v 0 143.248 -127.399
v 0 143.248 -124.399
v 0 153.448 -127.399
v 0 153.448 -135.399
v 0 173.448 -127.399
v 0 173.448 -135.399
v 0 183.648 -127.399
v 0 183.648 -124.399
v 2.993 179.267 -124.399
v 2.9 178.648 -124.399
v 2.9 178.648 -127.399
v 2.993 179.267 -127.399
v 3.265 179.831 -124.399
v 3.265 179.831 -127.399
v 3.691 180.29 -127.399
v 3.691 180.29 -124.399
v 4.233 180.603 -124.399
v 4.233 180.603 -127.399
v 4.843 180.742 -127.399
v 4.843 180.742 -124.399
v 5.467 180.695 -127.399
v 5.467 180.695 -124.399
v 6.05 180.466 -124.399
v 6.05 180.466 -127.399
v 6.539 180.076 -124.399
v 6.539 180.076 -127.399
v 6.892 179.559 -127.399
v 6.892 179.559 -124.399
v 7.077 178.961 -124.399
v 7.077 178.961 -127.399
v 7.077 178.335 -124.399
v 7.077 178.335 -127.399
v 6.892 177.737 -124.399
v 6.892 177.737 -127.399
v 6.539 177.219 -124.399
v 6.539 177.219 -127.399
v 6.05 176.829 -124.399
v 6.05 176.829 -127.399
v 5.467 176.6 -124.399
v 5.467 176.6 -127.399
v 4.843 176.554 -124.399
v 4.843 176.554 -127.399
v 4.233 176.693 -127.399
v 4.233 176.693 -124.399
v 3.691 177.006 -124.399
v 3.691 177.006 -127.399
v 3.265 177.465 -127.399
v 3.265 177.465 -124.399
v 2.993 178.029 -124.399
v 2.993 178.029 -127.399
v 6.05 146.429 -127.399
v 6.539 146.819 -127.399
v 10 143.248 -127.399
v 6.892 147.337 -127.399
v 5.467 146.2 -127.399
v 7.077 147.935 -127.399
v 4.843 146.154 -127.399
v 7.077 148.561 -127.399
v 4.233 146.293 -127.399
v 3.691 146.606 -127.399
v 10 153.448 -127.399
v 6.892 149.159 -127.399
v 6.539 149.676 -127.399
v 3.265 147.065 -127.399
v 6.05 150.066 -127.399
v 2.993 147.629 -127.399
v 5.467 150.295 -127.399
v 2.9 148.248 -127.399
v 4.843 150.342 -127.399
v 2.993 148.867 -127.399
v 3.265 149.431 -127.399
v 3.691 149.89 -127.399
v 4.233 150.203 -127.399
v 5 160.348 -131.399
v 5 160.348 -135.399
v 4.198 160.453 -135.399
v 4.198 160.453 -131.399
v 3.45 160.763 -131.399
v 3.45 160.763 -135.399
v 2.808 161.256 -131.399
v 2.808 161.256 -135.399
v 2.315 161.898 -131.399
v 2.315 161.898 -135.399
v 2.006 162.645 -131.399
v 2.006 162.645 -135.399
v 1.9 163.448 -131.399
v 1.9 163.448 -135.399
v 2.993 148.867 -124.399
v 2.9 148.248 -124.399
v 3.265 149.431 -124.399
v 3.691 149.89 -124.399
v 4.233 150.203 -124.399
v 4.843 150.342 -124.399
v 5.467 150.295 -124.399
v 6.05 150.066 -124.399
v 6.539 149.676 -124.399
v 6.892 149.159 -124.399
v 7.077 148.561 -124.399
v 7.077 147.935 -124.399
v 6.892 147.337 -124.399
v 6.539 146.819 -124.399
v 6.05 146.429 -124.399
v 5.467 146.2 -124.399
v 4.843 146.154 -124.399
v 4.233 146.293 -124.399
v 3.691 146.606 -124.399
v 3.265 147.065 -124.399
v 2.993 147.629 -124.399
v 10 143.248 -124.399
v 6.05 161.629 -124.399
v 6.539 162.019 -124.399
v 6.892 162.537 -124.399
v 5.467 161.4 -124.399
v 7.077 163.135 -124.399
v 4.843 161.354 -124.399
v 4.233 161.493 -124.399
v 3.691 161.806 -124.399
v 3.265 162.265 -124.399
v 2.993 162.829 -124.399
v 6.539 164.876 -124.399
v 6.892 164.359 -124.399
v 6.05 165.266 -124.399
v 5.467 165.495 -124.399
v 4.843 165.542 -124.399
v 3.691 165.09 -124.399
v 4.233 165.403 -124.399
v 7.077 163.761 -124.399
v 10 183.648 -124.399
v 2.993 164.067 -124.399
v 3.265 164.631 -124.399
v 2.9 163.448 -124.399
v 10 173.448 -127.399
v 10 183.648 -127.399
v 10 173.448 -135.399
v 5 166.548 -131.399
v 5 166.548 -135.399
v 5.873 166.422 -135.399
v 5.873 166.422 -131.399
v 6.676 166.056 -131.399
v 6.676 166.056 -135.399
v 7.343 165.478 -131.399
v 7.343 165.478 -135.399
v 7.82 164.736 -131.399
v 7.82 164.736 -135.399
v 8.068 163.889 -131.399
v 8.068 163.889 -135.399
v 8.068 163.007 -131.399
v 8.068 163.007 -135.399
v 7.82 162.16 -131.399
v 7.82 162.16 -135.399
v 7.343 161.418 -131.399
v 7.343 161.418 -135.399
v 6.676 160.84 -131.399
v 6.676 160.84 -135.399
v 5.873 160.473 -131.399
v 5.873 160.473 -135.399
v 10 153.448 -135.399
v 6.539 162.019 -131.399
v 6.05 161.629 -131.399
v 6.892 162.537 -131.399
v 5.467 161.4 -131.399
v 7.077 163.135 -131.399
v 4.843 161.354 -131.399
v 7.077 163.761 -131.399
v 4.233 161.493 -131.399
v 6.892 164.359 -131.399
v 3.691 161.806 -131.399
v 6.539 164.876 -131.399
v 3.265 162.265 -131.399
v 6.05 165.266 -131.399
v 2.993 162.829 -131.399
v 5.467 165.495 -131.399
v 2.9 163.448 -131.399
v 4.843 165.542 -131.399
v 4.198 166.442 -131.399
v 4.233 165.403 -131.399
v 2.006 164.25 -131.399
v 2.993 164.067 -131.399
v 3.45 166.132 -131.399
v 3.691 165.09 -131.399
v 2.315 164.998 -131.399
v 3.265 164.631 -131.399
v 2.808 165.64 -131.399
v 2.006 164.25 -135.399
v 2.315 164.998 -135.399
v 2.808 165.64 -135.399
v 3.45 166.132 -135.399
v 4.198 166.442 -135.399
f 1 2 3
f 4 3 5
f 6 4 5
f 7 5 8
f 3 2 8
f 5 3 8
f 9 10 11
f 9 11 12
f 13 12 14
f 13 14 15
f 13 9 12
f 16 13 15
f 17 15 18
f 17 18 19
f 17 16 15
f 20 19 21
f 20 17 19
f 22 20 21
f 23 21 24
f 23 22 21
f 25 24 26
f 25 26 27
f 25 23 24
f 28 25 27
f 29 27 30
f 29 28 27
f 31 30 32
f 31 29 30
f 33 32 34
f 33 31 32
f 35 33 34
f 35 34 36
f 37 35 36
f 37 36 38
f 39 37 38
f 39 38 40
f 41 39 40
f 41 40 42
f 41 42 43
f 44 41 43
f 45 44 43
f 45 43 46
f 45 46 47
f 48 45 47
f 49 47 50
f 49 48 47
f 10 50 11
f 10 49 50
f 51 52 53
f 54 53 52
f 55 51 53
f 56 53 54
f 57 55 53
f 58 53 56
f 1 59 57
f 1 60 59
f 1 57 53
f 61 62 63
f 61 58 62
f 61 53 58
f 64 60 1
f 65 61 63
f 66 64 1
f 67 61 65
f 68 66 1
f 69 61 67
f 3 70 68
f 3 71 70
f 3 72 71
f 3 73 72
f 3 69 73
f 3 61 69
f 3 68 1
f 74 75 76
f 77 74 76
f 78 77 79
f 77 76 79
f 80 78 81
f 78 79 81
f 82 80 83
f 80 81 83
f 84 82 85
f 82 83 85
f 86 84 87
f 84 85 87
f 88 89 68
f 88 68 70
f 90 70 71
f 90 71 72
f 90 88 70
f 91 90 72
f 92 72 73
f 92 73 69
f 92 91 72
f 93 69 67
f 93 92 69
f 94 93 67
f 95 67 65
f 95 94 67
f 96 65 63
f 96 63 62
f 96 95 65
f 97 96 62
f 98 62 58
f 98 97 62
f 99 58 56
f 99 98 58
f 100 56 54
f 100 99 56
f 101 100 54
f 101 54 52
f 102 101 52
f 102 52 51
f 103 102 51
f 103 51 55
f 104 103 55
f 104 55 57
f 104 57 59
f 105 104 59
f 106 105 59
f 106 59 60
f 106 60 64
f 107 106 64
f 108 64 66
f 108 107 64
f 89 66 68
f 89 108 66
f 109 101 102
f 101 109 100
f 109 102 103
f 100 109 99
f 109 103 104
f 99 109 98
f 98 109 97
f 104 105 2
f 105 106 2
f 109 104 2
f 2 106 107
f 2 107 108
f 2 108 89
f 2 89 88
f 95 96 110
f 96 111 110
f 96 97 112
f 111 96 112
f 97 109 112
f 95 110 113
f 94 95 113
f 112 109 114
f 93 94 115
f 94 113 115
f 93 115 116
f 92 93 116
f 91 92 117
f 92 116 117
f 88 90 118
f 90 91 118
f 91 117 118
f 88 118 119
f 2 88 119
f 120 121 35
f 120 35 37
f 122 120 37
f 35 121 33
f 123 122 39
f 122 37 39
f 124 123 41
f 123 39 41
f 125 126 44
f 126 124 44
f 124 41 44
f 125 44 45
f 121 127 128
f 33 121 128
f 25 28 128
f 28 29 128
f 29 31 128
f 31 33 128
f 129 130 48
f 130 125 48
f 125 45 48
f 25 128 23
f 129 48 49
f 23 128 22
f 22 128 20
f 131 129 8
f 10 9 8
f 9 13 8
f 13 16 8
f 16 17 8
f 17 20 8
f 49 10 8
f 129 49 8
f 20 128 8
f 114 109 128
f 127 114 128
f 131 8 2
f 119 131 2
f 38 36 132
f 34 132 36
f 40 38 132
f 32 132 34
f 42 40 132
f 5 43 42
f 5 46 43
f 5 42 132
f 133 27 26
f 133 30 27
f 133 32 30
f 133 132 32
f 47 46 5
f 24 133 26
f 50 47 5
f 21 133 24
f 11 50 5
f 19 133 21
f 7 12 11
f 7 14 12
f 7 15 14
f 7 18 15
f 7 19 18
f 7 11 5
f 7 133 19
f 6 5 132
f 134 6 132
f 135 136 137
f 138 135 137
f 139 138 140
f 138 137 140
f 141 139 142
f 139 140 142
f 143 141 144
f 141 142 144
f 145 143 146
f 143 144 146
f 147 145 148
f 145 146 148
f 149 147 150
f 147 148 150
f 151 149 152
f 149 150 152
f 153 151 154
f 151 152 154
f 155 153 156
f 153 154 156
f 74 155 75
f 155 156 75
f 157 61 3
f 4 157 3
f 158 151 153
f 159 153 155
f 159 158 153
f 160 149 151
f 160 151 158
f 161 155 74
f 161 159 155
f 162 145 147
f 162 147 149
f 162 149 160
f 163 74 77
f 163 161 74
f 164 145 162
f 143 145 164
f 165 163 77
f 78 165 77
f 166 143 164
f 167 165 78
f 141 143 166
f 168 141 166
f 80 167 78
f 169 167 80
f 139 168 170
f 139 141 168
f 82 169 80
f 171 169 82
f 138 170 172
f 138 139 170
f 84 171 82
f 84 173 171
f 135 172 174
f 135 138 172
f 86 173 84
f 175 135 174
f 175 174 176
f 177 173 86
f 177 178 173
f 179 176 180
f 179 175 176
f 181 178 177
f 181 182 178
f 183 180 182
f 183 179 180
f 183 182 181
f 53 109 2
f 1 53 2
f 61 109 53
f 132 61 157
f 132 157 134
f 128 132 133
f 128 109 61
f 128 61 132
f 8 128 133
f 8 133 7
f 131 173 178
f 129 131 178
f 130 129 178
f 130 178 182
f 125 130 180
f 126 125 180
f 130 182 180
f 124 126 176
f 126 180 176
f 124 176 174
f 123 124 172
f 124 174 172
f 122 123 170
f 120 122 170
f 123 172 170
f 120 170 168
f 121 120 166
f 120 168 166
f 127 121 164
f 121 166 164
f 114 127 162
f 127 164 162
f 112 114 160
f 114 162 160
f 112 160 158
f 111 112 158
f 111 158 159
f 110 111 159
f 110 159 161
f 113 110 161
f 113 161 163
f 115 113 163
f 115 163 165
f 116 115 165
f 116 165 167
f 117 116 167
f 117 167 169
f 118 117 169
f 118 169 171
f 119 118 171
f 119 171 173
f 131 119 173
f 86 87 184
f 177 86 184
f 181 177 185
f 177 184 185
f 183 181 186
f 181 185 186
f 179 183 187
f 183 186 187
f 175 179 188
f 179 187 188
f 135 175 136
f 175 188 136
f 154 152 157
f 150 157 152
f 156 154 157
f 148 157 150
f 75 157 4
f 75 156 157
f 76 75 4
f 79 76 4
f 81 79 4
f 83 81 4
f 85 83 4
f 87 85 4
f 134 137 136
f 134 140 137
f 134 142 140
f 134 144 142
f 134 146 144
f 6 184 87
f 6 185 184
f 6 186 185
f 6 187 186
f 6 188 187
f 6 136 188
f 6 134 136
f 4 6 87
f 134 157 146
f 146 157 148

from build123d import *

# Parameters (mm, degrees)
CROQUIS1_W              = 10
CROQUIS1_H              = 10
CROQUIS1_H_2            = 20.4
CROQUIS1_R              = 2.1
SALIENTE_EXTRUIR1_DEPTH = 3
CROQUIS2_W              = 5
CROQUIS2_H              = 20
SALIENTE_EXTRUIR2_DEPTH = 8
CORTAR_EXTRUIR1_DEPTH   = 4
CROQUIS4_R              = 2.1
CORTAR_EXTRUIR2_DEPTH   = 185.05302625


with BuildPart() as part:
    # Croquis1 → Saliente-Extruir1 (new body)
    # profile 1 of 6: a face of its own
    with BuildSketch(Plane(origin=(0, 0, -124.398862982), x_dir=(-1, 0, 0), z_dir=(0, 0, -1))):
        with Locations((-5, 178.647805519)):
            Rectangle(CROQUIS1_W, CROQUIS1_H)
        with BuildLine():
            ThreePointArc((-7.522554348, 176.84593994), (-7.904499228, 177.217722585), (-8.39233871, 177.432470964))
            ThreePointArc((-8.39233871, 177.432470964), (-9.35, 178.647805519), (-8.39233871, 179.863140073))
            ThreePointArc((-8.39233871, 179.863140073), (-7.904499228, 180.077888452), (-7.522554348, 180.449671097))
            ThreePointArc((-7.522554348, 180.449671097), (-1.9, 178.647805519), (-7.522554348, 176.84593994))
        make_face(mode=Mode.SUBTRACT)
    # profile 2 of 6: a face of its own
    with BuildSketch(Plane(origin=(0, 0, -124.398862982), x_dir=(-1, 0, 0), z_dir=(0, 0, -1))):
        with Locations((-5, 163.447805519)):
            Rectangle(CROQUIS1_W, CROQUIS1_H_2)
    # profile 3 of 6: a face of its own
    with BuildSketch(Plane(origin=(0, 0, -124.398862982), x_dir=(-1, 0, 0), z_dir=(0, 0, -1))):
        with Locations((-5, 148.247805519)):
            Rectangle(CROQUIS1_W, CROQUIS1_H)
        with BuildLine():
            ThreePointArc((-1.9, 148.247805519), (-4.053934061, 145.295694538), (-7.522554348, 146.44593994))
            ThreePointArc((-7.522554348, 146.44593994), (-8.1, 148.247805519), (-7.522554348, 150.049671097))
            ThreePointArc((-7.522554348, 150.049671097), (-4.053934061, 151.199916499), (-1.9, 148.247805519))
        make_face(mode=Mode.SUBTRACT)
    # profile 4 of 6: a face of its own
    with BuildSketch(Plane(origin=(0, 0, -124.398862982), x_dir=(-1, 0, 0), z_dir=(0, 0, -1))):
        with BuildLine():
            ThreePointArc((-7.522554348, 150.049671097), (-8.1, 148.247805519), (-7.522554348, 146.44593994))
            ThreePointArc((-7.522554348, 146.44593994), (-4.053934061, 145.295694538), (-1.9, 148.247805519))
            ThreePointArc((-1.9, 148.247805519), (-4.053934061, 151.199916499), (-7.522554348, 150.049671097))
        make_face()
        with Locations((-5, 148.247805519)):
            Circle(CROQUIS1_R, mode=Mode.SUBTRACT)
    # profile 5 of 6: a face of its own
    with BuildSketch(Plane(origin=(0, 0, -124.398862982), x_dir=(-1, 0, 0), z_dir=(0, 0, -1))):
        with BuildLine():
            ThreePointArc((-7.522554348, 180.449671097), (-8.1, 178.647805519), (-7.522554348, 176.84593994))
            ThreePointArc((-7.522554348, 176.84593994), (-4.053934061, 175.695694538), (-1.9, 178.647805519))
            ThreePointArc((-1.9, 178.647805519), (-4.053934061, 181.599916499), (-7.522554348, 180.449671097))
        make_face()
        with Locations((-5, 178.647805519)):
            Circle(CROQUIS1_R, mode=Mode.SUBTRACT)
    # profile 6 of 6: a face of its own
    with BuildSketch(Plane(origin=(0, 0, -124.398862982), x_dir=(-1, 0, 0), z_dir=(0, 0, -1))):
        with BuildLine():
            ThreePointArc((-8.39233871, 177.432470964), (-7.904499228, 177.217722585), (-7.522554348, 176.84593994))
            ThreePointArc((-7.522554348, 176.84593994), (-8.1, 178.647805519), (-7.522554348, 180.449671097))
            ThreePointArc((-7.522554348, 180.449671097), (-7.904499228, 180.077888452), (-8.39233871, 179.863140073))
            ThreePointArc((-8.39233871, 179.863140073), (-9.35, 178.647805519), (-8.39233871, 177.432470964))
        make_face()
    extrude(amount=SALIENTE_EXTRUIR1_DEPTH)

    # Croquis2 → Saliente-Extruir2 (add)
    with BuildSketch(Plane(origin=(0, 0, -127.398862982), x_dir=(-1, 0, 0), z_dir=(0, 0, -1))):
        with Locations((-2.5, 163.447805519)):
            Rectangle(CROQUIS2_W, CROQUIS2_H)
        with Locations((-7.5, 163.447805519)):
            Rectangle(CROQUIS2_W, CROQUIS2_H)
    extrude(amount=SALIENTE_EXTRUIR2_DEPTH)

    # Croquis3 → Cortar-Extruir1 (cut)
    with BuildSketch(Plane(origin=(0, 0, -135.398862982), x_dir=(-1, 0, 0), z_dir=(0, 0, -1))):
        with BuildLine():
            ThreePointArc((-1.9, 163.447805519), (-2.807968978, 165.63983654), (-5, 166.547805519))
            Line((-5, 166.547805519), (-5, 160.347805519))
            ThreePointArc((-5, 160.347805519), (-2.807968978, 161.255774497), (-1.9, 163.447805519))
        make_face()
        with BuildLine():
            Line((-5, 160.347805519), (-5, 166.547805519))
            ThreePointArc((-5, 166.547805519), (-8.1, 163.447805519), (-5, 160.347805519))
        make_face()
    extrude(amount=-CORTAR_EXTRUIR1_DEPTH, mode=Mode.SUBTRACT)

    # Croquis4 → Cortar-Extruir2 (cut, through all)
    with BuildSketch(Plane(origin=(0, 0, -131.398862982), x_dir=(-1, 0, 0), z_dir=(0, 0, -1))):
        with Locations((-5, 163.447805519)):
            Circle(CROQUIS4_R)
    extrude(amount=-CORTAR_EXTRUIR2_DEPTH, mode=Mode.SUBTRACT)


solid = part.part
